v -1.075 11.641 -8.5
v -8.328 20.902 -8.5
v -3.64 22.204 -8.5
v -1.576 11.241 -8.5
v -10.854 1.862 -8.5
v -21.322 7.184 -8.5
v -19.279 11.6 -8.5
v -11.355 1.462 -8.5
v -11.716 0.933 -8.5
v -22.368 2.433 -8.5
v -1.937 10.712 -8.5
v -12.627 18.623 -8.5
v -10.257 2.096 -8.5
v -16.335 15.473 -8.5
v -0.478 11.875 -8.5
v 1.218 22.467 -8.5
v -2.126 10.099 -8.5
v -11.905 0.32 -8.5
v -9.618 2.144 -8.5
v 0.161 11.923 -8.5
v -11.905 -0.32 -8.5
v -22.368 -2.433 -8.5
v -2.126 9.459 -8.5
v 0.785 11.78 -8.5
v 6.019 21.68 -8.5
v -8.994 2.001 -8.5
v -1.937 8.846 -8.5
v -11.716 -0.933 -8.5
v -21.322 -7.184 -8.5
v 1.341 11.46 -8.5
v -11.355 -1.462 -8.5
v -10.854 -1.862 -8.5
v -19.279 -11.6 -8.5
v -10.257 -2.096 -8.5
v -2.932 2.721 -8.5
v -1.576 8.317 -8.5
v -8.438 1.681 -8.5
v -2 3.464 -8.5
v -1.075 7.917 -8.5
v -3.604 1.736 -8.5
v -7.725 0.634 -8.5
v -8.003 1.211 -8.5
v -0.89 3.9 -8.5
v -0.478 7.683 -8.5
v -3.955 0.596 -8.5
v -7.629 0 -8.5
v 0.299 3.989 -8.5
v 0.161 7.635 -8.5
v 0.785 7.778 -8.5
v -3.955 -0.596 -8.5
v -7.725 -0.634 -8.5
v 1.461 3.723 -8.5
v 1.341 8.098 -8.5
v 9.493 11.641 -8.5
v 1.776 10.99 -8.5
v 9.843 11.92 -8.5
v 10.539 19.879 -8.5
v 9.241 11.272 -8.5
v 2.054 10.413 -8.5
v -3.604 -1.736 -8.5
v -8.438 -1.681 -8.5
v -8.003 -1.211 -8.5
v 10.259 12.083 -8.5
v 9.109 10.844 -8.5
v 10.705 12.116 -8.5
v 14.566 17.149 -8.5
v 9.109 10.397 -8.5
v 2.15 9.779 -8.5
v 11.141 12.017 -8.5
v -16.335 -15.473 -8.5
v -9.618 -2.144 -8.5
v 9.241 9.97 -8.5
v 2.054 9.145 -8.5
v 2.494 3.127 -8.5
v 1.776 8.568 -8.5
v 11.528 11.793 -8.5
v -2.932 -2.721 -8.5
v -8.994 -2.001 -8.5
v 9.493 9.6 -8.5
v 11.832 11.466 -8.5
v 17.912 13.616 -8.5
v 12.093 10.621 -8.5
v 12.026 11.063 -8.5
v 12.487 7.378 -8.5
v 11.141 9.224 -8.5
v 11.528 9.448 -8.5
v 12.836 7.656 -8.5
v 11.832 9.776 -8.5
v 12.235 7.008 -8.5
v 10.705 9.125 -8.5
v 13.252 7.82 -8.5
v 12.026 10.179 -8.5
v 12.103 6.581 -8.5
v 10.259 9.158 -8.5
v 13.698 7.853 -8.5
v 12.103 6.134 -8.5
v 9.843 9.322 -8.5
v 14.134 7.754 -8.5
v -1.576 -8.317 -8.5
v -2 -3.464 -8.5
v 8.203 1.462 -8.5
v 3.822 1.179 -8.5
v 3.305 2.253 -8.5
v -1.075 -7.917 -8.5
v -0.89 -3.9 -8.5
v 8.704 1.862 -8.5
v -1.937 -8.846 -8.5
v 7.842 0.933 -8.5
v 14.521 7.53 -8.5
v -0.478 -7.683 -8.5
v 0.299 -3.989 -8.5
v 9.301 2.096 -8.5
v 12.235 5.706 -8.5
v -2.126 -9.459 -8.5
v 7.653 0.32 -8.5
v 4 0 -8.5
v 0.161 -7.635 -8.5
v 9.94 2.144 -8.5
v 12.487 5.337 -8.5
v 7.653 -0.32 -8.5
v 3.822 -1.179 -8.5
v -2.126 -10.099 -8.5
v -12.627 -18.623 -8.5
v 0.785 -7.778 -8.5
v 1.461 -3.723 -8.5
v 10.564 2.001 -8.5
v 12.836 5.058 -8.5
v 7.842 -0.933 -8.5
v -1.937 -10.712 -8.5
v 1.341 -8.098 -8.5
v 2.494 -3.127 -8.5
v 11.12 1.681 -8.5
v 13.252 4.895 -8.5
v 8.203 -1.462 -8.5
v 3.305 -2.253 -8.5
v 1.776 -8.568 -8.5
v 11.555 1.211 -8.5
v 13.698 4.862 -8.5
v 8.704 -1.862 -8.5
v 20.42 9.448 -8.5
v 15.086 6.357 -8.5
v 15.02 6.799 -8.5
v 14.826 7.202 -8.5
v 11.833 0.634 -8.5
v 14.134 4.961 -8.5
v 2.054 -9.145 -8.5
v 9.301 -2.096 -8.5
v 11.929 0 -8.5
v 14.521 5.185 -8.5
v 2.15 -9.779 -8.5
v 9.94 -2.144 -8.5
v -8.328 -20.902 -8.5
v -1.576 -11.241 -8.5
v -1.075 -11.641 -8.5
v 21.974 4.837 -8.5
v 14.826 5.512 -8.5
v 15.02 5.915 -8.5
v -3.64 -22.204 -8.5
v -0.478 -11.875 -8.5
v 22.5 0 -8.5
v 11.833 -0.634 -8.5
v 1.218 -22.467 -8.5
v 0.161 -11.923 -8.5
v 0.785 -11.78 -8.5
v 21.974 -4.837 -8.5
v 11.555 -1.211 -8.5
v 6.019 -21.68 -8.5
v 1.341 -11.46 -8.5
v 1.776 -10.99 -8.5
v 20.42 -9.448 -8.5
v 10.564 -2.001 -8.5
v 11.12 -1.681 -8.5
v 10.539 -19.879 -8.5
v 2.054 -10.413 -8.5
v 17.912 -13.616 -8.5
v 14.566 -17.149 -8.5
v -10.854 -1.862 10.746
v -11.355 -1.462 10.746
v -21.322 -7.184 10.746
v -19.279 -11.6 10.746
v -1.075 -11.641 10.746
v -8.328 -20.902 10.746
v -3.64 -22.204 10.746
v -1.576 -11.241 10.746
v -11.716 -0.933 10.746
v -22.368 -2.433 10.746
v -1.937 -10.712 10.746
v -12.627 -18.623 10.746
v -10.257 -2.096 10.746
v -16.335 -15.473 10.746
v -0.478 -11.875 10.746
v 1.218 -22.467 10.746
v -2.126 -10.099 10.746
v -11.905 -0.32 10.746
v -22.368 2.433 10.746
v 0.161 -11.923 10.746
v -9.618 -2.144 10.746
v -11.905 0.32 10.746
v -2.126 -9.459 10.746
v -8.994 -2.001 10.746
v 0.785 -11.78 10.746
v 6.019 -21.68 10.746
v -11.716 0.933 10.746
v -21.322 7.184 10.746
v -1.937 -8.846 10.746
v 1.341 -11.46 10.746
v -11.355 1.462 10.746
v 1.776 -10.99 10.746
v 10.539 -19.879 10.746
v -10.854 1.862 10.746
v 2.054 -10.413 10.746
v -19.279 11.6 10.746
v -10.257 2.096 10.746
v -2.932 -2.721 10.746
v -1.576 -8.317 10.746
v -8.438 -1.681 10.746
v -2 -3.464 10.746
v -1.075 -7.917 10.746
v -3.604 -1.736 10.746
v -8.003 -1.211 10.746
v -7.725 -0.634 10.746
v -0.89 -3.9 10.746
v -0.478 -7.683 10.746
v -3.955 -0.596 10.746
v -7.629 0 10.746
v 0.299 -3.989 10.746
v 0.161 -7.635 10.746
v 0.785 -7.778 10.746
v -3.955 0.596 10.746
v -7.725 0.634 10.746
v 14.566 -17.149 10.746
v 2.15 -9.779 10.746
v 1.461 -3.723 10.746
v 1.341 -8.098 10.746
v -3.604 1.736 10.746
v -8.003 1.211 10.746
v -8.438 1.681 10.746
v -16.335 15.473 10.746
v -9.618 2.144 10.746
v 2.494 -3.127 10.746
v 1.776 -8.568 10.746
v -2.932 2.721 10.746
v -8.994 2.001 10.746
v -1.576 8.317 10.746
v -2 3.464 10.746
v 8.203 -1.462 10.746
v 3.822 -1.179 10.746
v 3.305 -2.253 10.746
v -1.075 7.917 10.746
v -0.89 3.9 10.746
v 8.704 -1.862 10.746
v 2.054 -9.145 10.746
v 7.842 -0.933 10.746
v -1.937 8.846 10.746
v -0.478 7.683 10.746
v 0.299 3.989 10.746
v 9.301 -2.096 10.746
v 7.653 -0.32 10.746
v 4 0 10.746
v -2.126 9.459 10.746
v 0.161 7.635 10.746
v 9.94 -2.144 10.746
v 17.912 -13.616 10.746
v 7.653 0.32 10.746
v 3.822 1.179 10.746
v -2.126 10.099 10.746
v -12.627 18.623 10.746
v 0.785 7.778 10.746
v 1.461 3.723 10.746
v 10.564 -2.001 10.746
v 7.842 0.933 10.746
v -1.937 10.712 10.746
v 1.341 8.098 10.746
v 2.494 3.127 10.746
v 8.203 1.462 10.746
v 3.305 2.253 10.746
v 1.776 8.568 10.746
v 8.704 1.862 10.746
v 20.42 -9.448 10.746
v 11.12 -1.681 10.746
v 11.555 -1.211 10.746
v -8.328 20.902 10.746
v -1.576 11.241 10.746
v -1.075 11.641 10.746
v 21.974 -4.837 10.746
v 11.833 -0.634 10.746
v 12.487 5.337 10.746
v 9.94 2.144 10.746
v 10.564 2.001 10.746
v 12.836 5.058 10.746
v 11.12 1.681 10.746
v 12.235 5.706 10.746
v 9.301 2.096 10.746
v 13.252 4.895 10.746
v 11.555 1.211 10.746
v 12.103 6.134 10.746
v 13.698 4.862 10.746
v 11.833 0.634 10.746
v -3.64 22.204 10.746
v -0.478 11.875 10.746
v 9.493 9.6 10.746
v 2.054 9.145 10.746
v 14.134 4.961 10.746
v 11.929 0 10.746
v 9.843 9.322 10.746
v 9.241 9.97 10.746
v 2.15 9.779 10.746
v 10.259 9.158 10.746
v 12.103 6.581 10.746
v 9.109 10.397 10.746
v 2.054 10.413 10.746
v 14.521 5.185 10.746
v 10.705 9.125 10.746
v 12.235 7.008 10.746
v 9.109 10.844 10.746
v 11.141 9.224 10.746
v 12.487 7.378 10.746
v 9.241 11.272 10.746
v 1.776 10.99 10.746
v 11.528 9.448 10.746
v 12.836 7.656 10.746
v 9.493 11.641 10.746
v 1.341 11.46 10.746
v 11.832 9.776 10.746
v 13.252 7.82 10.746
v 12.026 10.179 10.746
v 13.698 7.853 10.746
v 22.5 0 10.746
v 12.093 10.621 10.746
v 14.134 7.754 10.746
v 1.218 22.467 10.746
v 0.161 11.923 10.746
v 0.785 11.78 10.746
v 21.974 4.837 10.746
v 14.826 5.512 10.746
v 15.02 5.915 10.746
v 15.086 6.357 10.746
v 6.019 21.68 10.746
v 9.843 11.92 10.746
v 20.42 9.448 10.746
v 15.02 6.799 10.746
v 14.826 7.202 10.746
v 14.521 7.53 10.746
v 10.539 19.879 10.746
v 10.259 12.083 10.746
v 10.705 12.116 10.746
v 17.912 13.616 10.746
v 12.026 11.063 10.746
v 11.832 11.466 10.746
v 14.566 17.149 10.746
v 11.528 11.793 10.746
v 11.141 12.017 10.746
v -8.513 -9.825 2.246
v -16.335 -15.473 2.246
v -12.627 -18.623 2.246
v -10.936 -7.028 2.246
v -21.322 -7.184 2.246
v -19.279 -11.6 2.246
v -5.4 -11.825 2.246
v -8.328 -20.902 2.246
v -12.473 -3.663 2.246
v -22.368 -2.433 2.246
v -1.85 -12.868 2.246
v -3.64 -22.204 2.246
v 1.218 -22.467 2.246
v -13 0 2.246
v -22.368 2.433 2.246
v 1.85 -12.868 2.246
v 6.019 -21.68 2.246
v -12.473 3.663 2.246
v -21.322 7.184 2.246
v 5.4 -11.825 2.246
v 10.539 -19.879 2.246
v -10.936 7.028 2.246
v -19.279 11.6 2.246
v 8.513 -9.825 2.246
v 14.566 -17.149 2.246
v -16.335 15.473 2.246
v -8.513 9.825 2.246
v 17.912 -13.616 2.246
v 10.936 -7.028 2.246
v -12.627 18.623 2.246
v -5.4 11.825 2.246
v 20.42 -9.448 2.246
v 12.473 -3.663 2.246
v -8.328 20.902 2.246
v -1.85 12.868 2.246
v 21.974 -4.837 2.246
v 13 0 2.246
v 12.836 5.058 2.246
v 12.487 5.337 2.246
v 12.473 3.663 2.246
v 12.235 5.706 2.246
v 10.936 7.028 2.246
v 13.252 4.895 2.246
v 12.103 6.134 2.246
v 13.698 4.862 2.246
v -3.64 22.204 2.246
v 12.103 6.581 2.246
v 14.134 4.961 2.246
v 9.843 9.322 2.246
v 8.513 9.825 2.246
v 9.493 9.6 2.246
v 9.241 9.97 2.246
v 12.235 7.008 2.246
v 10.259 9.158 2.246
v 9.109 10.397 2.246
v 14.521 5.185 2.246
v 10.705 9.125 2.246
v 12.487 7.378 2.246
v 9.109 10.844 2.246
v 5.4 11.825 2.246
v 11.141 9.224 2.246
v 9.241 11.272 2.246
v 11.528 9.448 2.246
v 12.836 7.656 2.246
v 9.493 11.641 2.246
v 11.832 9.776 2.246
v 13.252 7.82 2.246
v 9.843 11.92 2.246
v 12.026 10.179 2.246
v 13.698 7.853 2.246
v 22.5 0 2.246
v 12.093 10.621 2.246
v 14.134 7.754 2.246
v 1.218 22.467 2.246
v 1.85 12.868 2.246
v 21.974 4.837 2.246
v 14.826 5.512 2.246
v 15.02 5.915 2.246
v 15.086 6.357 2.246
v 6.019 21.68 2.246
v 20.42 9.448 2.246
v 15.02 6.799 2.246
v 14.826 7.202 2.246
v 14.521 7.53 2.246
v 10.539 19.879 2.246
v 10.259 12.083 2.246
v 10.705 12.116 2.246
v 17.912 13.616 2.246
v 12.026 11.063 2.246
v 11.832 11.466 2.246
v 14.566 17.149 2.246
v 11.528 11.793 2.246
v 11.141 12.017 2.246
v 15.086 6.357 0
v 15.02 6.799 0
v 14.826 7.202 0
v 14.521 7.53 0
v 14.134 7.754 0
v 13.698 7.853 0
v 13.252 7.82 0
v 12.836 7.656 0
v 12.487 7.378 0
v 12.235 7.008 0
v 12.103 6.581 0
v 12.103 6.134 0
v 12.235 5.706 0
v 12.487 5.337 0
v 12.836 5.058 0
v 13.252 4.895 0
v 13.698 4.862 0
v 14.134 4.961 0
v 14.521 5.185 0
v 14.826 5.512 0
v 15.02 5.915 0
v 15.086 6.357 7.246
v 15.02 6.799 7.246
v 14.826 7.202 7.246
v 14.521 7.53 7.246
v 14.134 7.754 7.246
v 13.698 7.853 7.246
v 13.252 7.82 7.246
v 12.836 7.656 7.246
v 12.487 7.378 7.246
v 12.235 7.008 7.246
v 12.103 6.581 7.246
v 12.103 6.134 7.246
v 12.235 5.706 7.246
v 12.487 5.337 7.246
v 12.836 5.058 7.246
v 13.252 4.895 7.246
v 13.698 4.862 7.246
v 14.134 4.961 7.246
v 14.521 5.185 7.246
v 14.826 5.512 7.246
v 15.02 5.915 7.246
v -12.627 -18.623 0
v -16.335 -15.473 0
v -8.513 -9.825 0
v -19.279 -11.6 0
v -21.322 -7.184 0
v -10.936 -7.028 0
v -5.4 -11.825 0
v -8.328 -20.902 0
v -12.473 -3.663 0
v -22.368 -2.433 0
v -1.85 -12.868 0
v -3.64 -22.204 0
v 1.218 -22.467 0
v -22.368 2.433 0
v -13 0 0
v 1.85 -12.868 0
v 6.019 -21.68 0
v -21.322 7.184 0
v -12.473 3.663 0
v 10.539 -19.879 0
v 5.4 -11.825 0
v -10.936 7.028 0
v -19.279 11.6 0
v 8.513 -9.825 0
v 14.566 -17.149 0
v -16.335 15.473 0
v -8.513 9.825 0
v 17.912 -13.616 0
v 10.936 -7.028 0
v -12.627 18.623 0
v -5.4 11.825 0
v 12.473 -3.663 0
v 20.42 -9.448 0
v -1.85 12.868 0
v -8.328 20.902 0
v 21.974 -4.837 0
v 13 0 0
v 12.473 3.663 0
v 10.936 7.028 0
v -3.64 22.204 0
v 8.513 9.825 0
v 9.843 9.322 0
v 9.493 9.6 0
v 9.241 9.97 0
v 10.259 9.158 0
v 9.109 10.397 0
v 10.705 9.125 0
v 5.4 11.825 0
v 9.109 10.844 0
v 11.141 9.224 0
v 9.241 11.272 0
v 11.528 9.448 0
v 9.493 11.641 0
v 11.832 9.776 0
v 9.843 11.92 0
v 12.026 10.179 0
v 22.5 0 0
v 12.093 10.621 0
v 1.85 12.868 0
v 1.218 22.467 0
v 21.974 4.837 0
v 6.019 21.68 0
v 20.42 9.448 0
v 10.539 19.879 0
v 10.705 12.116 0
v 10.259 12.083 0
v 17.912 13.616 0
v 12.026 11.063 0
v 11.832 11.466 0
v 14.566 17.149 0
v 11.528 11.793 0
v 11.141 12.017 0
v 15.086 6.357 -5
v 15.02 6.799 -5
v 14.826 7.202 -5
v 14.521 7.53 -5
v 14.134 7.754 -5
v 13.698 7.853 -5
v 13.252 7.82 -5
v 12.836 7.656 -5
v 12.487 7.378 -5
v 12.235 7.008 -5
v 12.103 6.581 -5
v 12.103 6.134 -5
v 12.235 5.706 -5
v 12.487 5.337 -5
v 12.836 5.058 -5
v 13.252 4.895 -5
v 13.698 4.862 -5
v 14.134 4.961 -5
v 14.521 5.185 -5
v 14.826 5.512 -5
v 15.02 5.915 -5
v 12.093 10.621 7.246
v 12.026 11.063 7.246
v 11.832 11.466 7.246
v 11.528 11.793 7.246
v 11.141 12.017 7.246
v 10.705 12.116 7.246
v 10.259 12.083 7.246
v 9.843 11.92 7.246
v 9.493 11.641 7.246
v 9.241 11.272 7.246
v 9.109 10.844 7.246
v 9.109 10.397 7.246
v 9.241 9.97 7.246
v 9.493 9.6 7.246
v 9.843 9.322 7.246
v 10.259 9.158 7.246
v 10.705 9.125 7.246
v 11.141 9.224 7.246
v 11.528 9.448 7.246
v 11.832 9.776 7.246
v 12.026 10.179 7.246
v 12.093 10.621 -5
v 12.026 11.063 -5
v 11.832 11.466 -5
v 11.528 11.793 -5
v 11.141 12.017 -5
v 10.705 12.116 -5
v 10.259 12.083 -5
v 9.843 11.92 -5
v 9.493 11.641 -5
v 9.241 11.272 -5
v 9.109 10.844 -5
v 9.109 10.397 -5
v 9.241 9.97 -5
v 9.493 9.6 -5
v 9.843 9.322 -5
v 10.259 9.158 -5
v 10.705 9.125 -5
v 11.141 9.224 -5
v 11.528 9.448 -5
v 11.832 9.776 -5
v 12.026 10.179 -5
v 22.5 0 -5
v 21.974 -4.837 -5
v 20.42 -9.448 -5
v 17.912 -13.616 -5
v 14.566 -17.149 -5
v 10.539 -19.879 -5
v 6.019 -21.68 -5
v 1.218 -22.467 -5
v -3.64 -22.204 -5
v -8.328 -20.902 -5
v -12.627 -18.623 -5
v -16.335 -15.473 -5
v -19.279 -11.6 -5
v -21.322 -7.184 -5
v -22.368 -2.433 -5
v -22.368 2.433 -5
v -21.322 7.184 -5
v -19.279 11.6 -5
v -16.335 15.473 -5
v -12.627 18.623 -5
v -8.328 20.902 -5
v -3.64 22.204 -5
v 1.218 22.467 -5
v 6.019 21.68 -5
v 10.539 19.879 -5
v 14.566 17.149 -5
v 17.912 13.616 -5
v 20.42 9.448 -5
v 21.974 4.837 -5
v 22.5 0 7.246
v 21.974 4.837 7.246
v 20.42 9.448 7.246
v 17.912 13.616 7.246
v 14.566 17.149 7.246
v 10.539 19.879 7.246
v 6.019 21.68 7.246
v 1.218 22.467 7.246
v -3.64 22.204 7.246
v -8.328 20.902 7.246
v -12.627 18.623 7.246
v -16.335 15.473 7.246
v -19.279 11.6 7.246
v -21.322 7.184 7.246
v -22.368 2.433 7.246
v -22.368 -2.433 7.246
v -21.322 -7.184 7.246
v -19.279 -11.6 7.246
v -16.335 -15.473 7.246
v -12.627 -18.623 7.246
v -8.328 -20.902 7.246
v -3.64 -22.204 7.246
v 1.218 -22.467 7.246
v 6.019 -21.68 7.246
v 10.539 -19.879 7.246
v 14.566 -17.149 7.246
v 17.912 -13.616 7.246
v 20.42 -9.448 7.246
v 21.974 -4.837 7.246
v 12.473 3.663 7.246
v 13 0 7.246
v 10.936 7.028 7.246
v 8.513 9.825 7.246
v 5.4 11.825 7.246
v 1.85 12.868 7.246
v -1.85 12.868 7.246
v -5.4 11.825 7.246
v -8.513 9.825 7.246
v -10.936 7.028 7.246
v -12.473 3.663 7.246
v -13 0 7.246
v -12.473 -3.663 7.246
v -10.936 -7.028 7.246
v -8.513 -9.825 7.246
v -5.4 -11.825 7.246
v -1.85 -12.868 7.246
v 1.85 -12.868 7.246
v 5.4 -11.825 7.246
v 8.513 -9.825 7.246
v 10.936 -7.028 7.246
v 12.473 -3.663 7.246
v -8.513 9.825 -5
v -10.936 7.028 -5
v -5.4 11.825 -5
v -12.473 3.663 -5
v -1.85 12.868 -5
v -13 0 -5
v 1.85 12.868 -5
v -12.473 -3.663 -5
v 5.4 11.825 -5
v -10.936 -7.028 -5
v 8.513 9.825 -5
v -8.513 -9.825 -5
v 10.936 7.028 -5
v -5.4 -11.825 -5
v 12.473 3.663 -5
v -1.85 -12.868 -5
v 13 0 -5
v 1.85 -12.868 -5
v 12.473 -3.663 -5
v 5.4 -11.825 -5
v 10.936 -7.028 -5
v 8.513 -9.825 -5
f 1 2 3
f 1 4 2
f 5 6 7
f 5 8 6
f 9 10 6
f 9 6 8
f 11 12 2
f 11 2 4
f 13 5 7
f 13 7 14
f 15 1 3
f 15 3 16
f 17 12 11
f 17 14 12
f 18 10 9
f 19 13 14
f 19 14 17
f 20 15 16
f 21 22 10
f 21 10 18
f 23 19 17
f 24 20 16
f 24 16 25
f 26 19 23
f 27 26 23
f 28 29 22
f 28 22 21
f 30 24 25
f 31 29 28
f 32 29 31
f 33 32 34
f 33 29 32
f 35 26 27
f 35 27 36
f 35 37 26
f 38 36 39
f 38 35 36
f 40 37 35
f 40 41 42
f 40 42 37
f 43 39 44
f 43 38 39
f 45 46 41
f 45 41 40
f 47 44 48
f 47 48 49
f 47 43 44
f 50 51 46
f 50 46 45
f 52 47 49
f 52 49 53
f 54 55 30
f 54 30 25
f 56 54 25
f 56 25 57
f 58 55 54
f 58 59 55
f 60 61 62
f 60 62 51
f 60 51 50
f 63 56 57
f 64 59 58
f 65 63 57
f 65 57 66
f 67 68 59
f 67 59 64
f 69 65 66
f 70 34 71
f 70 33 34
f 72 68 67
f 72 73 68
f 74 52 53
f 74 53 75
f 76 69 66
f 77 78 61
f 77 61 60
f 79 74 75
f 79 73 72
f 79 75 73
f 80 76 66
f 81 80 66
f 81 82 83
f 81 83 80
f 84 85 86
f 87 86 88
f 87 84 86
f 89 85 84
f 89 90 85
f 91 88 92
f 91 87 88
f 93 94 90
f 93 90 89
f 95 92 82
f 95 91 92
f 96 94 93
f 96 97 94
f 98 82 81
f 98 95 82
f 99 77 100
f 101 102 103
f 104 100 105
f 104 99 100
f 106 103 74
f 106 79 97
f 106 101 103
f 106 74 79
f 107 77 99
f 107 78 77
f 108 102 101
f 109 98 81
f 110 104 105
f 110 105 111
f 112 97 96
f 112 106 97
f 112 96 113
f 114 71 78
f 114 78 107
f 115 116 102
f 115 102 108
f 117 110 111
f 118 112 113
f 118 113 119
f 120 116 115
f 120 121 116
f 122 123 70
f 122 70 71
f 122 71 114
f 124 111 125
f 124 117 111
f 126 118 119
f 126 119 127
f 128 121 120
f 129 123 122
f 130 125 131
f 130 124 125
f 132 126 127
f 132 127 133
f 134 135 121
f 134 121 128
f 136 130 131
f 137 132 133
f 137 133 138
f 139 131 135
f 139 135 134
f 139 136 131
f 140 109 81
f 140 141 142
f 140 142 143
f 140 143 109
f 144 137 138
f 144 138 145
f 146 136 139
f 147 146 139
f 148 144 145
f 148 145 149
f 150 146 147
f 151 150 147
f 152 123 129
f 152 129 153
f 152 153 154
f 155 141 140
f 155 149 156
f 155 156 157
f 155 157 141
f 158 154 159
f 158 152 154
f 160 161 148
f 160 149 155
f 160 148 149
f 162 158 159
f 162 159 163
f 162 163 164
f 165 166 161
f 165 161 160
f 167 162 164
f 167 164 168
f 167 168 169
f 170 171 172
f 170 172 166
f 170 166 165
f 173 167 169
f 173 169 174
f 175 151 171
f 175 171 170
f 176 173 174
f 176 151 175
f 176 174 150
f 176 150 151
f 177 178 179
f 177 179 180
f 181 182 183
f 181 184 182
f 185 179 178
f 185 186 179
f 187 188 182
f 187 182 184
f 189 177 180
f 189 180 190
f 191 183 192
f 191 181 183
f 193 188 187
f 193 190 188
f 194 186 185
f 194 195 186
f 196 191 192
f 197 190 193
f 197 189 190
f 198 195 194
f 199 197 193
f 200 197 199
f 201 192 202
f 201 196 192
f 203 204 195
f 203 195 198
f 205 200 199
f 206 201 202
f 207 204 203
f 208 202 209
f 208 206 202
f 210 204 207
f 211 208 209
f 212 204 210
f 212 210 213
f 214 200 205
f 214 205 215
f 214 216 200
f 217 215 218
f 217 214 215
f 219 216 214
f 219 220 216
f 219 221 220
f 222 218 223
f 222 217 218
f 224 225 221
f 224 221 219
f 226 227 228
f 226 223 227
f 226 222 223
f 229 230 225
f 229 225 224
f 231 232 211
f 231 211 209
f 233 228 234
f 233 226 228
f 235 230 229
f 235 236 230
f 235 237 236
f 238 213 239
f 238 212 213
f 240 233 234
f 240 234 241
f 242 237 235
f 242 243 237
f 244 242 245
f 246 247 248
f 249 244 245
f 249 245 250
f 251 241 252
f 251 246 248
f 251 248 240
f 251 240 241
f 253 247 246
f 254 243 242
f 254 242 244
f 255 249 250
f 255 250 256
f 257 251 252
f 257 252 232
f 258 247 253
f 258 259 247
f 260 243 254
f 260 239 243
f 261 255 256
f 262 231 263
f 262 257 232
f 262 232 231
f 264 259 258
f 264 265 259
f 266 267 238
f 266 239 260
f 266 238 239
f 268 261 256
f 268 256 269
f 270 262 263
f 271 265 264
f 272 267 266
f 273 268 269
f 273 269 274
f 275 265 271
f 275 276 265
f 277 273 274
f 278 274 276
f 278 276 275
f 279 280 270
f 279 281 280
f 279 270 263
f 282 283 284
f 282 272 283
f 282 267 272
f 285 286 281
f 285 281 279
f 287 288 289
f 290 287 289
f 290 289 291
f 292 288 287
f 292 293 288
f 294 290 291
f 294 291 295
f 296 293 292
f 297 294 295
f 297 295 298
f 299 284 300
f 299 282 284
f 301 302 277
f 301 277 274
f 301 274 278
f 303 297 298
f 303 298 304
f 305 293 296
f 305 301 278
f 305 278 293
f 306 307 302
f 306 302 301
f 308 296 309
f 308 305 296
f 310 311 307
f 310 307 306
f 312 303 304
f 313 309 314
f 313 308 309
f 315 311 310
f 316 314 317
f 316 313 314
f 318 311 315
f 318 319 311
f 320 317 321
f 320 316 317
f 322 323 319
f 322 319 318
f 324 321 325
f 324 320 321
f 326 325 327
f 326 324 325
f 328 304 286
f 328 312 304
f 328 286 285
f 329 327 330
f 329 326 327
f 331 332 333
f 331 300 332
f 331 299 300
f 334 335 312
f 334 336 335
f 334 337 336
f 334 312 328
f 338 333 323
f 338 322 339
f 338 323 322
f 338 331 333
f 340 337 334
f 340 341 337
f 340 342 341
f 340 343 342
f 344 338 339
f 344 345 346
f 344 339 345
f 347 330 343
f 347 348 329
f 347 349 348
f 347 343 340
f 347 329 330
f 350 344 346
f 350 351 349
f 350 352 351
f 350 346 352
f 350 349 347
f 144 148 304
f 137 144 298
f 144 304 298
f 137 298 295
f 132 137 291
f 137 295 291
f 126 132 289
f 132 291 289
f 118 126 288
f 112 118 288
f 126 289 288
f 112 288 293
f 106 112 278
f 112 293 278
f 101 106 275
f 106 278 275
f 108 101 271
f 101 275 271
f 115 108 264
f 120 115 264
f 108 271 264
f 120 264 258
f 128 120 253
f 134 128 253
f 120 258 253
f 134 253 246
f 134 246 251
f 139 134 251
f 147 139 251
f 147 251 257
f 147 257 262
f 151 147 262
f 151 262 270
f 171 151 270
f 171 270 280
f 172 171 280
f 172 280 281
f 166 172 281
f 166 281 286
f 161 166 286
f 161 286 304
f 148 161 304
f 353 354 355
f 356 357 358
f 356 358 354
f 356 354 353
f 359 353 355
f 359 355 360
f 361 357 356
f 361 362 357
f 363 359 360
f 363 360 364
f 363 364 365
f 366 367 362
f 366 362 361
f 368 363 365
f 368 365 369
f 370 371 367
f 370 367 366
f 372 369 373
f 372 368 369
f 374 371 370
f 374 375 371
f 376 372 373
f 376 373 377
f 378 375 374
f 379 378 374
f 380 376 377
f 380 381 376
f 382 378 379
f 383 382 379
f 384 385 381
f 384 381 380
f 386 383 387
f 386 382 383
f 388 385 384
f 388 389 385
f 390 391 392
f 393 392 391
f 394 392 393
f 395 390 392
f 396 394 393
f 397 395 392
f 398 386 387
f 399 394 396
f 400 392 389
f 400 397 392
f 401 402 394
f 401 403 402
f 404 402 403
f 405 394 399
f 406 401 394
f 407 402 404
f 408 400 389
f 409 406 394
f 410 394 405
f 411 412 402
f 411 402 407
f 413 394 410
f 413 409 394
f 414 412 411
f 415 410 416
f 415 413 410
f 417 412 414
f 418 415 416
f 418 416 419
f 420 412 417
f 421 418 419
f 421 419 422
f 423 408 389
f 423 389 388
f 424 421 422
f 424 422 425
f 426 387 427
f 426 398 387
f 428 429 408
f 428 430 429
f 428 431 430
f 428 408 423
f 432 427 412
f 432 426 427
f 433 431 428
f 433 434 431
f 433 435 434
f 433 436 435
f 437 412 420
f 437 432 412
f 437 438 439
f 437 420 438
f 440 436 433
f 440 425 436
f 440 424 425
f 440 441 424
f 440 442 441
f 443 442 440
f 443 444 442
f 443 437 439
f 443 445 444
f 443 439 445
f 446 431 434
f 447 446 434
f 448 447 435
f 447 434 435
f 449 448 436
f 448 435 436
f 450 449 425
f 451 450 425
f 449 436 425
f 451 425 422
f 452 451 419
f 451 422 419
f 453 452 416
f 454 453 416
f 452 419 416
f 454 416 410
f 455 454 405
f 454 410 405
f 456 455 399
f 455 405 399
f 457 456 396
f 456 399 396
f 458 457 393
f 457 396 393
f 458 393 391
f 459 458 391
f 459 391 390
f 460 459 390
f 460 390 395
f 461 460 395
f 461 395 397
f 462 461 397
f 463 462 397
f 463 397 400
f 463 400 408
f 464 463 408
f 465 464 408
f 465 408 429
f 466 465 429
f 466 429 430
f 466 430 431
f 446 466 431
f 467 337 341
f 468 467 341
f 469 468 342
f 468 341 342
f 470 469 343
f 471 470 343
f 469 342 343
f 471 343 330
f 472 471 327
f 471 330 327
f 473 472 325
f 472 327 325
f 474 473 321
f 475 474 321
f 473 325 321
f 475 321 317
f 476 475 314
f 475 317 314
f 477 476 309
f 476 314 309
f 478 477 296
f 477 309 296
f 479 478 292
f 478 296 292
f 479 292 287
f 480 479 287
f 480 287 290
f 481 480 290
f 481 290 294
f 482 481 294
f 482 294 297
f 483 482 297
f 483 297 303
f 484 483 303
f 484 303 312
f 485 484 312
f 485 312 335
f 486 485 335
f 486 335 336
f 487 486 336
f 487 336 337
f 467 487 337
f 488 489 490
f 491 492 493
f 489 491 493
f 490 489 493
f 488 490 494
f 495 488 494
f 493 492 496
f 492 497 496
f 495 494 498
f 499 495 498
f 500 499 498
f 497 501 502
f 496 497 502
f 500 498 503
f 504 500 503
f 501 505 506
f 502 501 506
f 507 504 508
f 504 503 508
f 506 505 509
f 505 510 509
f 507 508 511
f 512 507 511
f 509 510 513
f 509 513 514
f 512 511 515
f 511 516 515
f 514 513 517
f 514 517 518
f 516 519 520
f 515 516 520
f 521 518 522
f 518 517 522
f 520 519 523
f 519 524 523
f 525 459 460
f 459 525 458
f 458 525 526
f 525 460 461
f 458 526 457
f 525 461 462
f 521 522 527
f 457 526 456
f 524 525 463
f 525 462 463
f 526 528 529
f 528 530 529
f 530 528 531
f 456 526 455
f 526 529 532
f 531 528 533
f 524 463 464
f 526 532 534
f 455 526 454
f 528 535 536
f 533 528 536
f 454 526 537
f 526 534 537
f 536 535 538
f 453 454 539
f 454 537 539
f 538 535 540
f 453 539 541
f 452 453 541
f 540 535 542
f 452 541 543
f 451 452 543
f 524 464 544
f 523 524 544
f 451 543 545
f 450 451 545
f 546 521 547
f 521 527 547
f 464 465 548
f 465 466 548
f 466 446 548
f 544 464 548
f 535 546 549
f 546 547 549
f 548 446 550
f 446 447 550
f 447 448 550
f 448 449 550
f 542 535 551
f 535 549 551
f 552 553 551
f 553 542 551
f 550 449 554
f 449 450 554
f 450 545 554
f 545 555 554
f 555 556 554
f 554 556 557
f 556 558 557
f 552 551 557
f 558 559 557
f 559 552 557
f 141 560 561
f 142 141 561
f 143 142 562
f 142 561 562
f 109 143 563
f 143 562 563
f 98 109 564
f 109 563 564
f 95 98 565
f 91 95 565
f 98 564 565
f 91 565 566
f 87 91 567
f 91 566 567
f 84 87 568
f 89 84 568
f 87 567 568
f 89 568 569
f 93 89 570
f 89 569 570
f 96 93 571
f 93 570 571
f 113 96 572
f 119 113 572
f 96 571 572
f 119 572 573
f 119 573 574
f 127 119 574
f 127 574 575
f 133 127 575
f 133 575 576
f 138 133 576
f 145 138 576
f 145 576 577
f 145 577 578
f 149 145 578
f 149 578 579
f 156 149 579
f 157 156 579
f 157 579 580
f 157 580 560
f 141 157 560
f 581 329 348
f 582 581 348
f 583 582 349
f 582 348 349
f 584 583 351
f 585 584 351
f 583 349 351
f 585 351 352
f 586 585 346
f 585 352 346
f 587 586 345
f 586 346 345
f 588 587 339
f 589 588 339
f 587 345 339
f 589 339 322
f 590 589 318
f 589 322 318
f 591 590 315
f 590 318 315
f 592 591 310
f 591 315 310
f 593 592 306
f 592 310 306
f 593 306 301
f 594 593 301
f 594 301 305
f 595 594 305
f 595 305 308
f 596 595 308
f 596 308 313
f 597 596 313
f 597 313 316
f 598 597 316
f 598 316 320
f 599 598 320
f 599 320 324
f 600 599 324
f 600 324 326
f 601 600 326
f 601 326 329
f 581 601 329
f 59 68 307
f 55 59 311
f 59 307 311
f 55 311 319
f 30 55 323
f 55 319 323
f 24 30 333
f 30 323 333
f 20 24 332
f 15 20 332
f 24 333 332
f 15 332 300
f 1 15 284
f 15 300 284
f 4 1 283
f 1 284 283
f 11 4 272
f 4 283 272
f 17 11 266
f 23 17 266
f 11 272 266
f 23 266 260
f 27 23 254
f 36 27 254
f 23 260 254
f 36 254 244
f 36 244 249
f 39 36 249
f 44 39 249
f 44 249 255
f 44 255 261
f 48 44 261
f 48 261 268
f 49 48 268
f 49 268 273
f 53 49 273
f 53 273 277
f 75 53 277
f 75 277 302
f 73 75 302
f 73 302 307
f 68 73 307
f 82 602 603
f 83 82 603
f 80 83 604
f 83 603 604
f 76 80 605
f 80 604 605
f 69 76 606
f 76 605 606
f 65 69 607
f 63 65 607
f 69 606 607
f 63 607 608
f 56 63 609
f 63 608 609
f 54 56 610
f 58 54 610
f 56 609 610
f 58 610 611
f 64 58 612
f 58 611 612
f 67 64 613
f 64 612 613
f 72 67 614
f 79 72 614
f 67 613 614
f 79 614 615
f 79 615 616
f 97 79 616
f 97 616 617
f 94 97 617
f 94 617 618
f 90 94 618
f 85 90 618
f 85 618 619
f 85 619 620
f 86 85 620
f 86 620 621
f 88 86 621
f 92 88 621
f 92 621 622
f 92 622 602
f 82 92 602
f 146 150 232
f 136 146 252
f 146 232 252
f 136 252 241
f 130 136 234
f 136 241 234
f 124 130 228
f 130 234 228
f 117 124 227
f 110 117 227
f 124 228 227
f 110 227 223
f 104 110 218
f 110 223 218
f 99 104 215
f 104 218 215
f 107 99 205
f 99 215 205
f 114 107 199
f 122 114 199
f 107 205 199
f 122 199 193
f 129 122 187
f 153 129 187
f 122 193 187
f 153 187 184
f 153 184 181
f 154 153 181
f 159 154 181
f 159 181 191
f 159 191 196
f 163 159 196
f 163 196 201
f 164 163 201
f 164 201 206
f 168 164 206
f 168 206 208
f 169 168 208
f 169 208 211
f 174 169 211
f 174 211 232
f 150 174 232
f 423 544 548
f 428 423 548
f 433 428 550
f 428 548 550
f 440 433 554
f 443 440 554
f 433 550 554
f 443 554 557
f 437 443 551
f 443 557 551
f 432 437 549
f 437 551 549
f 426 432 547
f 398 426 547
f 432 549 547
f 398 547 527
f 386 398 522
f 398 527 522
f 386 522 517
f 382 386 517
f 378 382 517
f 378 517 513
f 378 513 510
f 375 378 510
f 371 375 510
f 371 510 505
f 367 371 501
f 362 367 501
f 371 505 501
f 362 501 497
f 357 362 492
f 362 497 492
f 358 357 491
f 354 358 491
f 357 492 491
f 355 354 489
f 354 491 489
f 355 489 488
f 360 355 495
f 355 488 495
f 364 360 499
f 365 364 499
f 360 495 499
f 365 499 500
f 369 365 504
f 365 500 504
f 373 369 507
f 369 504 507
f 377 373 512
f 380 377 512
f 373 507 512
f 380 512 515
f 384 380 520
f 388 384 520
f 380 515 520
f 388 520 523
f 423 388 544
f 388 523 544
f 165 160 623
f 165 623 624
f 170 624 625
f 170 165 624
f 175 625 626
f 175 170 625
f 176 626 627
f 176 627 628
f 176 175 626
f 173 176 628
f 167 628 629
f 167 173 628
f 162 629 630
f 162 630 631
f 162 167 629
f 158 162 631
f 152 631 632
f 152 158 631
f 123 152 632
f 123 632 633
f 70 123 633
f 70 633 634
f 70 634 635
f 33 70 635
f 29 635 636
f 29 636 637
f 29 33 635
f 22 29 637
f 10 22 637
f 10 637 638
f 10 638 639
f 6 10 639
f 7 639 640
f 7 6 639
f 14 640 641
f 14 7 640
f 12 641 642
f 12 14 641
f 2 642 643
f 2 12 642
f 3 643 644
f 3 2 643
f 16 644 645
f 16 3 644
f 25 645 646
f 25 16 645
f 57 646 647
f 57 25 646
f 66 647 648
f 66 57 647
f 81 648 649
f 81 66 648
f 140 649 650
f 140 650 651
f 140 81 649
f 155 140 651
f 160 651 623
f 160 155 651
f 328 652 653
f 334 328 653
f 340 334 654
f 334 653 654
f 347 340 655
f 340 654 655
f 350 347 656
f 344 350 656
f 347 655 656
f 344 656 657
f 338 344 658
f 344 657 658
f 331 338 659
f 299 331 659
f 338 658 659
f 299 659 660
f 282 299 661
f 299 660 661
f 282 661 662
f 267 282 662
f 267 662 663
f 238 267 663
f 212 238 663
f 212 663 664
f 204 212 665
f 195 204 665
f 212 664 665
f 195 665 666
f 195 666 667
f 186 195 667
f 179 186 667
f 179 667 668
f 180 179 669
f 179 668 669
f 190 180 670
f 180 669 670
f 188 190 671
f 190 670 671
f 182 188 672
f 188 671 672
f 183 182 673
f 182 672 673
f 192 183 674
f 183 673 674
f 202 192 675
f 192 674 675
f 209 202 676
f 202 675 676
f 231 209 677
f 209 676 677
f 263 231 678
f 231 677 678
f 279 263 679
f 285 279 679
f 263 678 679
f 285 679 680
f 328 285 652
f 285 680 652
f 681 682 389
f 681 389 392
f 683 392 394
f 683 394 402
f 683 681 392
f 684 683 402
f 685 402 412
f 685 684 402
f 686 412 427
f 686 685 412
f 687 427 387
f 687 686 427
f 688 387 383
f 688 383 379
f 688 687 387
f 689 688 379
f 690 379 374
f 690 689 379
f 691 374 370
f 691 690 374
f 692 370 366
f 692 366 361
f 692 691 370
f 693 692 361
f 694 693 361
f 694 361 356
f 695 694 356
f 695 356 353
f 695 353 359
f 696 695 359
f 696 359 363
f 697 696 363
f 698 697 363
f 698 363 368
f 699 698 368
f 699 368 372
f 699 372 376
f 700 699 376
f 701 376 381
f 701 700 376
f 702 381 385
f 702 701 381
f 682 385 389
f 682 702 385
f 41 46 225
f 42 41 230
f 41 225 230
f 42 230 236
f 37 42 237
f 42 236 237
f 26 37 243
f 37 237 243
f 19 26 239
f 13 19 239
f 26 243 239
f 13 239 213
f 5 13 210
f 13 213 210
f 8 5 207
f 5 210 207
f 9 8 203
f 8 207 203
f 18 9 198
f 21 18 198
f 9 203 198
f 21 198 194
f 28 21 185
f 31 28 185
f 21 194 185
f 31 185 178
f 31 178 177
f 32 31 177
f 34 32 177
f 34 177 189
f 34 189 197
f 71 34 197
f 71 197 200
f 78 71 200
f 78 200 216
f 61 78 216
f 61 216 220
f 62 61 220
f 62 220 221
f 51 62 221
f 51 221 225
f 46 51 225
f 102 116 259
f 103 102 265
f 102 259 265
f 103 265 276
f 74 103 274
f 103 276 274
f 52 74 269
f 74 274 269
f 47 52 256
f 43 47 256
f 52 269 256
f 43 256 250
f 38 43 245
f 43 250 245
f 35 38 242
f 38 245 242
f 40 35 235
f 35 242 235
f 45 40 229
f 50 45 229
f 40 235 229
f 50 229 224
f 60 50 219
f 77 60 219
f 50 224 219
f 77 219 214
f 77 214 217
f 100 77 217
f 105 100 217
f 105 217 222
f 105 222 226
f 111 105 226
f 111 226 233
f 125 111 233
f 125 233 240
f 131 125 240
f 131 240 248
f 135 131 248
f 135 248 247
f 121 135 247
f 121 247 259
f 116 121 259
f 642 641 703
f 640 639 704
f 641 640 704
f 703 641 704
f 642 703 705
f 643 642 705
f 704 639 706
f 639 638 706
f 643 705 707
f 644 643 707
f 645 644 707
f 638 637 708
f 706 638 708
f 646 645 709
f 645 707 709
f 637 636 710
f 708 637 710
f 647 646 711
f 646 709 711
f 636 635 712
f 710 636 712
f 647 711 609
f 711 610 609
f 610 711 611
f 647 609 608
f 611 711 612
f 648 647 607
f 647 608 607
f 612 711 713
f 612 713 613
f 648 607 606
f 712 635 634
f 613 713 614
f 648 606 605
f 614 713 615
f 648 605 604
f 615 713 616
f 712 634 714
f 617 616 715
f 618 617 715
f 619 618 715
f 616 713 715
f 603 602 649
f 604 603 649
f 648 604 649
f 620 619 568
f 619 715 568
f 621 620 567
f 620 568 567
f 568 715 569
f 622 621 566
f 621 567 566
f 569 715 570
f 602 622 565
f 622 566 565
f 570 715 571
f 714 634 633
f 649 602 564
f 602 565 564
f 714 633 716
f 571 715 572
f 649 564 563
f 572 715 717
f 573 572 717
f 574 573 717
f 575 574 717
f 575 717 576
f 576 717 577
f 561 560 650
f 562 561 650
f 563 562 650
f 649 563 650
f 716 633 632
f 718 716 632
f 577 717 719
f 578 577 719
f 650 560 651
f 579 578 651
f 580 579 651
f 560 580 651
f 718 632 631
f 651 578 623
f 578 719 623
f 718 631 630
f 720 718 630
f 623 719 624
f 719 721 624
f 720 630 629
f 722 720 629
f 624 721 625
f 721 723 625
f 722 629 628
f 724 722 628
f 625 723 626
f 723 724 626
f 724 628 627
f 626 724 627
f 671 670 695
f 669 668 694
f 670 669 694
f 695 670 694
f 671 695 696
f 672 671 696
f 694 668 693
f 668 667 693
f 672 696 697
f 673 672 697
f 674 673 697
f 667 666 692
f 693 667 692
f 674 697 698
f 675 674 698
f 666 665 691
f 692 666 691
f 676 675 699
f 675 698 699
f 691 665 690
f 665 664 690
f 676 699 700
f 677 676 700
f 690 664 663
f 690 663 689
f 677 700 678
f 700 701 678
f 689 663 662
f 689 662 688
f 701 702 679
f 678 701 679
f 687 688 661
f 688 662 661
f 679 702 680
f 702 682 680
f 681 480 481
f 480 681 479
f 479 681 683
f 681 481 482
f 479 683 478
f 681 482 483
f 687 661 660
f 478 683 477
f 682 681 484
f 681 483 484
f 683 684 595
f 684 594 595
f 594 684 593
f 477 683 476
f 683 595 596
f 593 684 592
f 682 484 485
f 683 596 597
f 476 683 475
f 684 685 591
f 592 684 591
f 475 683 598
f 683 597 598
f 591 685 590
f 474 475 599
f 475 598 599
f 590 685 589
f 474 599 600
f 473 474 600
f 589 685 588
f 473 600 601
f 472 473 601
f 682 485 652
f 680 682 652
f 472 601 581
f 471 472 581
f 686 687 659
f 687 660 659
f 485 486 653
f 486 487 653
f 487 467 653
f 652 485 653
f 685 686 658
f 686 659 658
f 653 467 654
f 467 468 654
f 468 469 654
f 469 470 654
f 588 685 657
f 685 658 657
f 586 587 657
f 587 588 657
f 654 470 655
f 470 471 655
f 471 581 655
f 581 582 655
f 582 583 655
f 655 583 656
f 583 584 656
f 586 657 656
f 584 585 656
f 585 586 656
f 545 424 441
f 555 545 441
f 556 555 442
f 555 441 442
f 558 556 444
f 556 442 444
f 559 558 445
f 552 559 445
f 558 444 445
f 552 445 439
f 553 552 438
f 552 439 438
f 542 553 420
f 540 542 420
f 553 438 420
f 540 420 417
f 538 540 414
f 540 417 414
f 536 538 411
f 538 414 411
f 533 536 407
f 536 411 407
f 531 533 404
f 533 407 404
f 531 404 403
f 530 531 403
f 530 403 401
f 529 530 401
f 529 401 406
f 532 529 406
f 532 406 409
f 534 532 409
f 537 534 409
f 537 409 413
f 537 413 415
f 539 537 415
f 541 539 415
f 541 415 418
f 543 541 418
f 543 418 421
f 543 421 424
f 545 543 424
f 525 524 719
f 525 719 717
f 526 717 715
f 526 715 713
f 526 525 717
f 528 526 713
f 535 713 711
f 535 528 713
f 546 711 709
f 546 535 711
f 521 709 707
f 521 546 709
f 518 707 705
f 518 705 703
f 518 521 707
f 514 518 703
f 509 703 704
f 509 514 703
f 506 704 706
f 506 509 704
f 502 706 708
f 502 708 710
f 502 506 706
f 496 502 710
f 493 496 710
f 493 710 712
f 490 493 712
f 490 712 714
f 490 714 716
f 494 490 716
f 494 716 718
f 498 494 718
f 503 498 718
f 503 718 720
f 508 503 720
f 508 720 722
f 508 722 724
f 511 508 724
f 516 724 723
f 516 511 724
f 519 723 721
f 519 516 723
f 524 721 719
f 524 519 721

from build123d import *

# Parameters (mm, degrees)
SKETCH1_R           = 22.5
BOSS_EXTRUDE1_DEPTH = 2.24600008
SKETCH2_R           = 13
BOSS_EXTRUDE2_DEPTH = 5
BOSS_EXTRUDE4_START = 3.5
SKETCH5_R           = 22.5
BOSS_EXTRUDE4_DEPTH = 3.5
BOSS_EXTRUDE5_START = 5
SKETCH8_R           = 13
BOSS_EXTRUDE5_DEPTH = 5
SKETCH12_R          = 22.5
BOSS_EXTRUDE6_DEPTH = 3.5
SKETCH6_R           = 4
SKETCH6_R_2         = 2.15
SKETCH6_R_3         = 1.5
CUT_EXTRUDE1_DEPTH  = 38.187477988


with BuildPart() as part:
    # Sketch1 → Boss-Extrude1 (new body)
    with BuildSketch(Plane.XY):
        Circle(SKETCH1_R)
    extrude(amount=BOSS_EXTRUDE1_DEPTH)

    # Sketch2 → Boss-Extrude2 (add)
    with BuildSketch(Plane.XY):
        Circle(SKETCH2_R)
    extrude(amount=-BOSS_EXTRUDE2_DEPTH)

    # Sketch5 → Boss-Extrude4 (add)
    with BuildSketch(Plane(origin=(0, 0, -5), x_dir=(-1, 0, 0), z_dir=(0, 0, -1)).offset(BOSS_EXTRUDE4_START)):
        with Locations(Location((0, 0, 0), (0, 0, 180))):
            Circle(SKETCH5_R)
    extrude(amount=-BOSS_EXTRUDE4_DEPTH)

    # Sketch8 → Boss-Extrude5 (add)
    with BuildSketch(Plane.XY.offset(2.24600008).offset(BOSS_EXTRUDE5_START)):
        Circle(SKETCH8_R)
    extrude(amount=-BOSS_EXTRUDE5_DEPTH)

    # Sketch12 → Boss-Extrude6 (add)
    with BuildSketch(Plane.XY.offset(7.24600008)):
        Circle(SKETCH12_R)
    extrude(amount=BOSS_EXTRUDE6_DEPTH)

    # Sketch6 → Cut-Extrude1 (cut, through all)
    with BuildSketch(Plane.XY.offset(10.74600008)):
        Circle(SKETCH6_R)
        with Locations((0, 9.779)):
            Circle(SKETCH6_R_2)
        with Locations((9.779, 0)):
            Circle(SKETCH6_R_2)
        with Locations((0, -9.779)):
            Circle(SKETCH6_R_2)
        with Locations((-9.779, 0)):
            Circle(SKETCH6_R_2)
        with Locations((10.592506585, 10.620678145)):
            Circle(SKETCH6_R_3)
        with Locations((13.586186135, 6.35732226)):
            Circle(SKETCH6_R_3)
    extrude(amount=-CUT_EXTRUDE1_DEPTH, mode=Mode.SUBTRACT)


solid = part.part
